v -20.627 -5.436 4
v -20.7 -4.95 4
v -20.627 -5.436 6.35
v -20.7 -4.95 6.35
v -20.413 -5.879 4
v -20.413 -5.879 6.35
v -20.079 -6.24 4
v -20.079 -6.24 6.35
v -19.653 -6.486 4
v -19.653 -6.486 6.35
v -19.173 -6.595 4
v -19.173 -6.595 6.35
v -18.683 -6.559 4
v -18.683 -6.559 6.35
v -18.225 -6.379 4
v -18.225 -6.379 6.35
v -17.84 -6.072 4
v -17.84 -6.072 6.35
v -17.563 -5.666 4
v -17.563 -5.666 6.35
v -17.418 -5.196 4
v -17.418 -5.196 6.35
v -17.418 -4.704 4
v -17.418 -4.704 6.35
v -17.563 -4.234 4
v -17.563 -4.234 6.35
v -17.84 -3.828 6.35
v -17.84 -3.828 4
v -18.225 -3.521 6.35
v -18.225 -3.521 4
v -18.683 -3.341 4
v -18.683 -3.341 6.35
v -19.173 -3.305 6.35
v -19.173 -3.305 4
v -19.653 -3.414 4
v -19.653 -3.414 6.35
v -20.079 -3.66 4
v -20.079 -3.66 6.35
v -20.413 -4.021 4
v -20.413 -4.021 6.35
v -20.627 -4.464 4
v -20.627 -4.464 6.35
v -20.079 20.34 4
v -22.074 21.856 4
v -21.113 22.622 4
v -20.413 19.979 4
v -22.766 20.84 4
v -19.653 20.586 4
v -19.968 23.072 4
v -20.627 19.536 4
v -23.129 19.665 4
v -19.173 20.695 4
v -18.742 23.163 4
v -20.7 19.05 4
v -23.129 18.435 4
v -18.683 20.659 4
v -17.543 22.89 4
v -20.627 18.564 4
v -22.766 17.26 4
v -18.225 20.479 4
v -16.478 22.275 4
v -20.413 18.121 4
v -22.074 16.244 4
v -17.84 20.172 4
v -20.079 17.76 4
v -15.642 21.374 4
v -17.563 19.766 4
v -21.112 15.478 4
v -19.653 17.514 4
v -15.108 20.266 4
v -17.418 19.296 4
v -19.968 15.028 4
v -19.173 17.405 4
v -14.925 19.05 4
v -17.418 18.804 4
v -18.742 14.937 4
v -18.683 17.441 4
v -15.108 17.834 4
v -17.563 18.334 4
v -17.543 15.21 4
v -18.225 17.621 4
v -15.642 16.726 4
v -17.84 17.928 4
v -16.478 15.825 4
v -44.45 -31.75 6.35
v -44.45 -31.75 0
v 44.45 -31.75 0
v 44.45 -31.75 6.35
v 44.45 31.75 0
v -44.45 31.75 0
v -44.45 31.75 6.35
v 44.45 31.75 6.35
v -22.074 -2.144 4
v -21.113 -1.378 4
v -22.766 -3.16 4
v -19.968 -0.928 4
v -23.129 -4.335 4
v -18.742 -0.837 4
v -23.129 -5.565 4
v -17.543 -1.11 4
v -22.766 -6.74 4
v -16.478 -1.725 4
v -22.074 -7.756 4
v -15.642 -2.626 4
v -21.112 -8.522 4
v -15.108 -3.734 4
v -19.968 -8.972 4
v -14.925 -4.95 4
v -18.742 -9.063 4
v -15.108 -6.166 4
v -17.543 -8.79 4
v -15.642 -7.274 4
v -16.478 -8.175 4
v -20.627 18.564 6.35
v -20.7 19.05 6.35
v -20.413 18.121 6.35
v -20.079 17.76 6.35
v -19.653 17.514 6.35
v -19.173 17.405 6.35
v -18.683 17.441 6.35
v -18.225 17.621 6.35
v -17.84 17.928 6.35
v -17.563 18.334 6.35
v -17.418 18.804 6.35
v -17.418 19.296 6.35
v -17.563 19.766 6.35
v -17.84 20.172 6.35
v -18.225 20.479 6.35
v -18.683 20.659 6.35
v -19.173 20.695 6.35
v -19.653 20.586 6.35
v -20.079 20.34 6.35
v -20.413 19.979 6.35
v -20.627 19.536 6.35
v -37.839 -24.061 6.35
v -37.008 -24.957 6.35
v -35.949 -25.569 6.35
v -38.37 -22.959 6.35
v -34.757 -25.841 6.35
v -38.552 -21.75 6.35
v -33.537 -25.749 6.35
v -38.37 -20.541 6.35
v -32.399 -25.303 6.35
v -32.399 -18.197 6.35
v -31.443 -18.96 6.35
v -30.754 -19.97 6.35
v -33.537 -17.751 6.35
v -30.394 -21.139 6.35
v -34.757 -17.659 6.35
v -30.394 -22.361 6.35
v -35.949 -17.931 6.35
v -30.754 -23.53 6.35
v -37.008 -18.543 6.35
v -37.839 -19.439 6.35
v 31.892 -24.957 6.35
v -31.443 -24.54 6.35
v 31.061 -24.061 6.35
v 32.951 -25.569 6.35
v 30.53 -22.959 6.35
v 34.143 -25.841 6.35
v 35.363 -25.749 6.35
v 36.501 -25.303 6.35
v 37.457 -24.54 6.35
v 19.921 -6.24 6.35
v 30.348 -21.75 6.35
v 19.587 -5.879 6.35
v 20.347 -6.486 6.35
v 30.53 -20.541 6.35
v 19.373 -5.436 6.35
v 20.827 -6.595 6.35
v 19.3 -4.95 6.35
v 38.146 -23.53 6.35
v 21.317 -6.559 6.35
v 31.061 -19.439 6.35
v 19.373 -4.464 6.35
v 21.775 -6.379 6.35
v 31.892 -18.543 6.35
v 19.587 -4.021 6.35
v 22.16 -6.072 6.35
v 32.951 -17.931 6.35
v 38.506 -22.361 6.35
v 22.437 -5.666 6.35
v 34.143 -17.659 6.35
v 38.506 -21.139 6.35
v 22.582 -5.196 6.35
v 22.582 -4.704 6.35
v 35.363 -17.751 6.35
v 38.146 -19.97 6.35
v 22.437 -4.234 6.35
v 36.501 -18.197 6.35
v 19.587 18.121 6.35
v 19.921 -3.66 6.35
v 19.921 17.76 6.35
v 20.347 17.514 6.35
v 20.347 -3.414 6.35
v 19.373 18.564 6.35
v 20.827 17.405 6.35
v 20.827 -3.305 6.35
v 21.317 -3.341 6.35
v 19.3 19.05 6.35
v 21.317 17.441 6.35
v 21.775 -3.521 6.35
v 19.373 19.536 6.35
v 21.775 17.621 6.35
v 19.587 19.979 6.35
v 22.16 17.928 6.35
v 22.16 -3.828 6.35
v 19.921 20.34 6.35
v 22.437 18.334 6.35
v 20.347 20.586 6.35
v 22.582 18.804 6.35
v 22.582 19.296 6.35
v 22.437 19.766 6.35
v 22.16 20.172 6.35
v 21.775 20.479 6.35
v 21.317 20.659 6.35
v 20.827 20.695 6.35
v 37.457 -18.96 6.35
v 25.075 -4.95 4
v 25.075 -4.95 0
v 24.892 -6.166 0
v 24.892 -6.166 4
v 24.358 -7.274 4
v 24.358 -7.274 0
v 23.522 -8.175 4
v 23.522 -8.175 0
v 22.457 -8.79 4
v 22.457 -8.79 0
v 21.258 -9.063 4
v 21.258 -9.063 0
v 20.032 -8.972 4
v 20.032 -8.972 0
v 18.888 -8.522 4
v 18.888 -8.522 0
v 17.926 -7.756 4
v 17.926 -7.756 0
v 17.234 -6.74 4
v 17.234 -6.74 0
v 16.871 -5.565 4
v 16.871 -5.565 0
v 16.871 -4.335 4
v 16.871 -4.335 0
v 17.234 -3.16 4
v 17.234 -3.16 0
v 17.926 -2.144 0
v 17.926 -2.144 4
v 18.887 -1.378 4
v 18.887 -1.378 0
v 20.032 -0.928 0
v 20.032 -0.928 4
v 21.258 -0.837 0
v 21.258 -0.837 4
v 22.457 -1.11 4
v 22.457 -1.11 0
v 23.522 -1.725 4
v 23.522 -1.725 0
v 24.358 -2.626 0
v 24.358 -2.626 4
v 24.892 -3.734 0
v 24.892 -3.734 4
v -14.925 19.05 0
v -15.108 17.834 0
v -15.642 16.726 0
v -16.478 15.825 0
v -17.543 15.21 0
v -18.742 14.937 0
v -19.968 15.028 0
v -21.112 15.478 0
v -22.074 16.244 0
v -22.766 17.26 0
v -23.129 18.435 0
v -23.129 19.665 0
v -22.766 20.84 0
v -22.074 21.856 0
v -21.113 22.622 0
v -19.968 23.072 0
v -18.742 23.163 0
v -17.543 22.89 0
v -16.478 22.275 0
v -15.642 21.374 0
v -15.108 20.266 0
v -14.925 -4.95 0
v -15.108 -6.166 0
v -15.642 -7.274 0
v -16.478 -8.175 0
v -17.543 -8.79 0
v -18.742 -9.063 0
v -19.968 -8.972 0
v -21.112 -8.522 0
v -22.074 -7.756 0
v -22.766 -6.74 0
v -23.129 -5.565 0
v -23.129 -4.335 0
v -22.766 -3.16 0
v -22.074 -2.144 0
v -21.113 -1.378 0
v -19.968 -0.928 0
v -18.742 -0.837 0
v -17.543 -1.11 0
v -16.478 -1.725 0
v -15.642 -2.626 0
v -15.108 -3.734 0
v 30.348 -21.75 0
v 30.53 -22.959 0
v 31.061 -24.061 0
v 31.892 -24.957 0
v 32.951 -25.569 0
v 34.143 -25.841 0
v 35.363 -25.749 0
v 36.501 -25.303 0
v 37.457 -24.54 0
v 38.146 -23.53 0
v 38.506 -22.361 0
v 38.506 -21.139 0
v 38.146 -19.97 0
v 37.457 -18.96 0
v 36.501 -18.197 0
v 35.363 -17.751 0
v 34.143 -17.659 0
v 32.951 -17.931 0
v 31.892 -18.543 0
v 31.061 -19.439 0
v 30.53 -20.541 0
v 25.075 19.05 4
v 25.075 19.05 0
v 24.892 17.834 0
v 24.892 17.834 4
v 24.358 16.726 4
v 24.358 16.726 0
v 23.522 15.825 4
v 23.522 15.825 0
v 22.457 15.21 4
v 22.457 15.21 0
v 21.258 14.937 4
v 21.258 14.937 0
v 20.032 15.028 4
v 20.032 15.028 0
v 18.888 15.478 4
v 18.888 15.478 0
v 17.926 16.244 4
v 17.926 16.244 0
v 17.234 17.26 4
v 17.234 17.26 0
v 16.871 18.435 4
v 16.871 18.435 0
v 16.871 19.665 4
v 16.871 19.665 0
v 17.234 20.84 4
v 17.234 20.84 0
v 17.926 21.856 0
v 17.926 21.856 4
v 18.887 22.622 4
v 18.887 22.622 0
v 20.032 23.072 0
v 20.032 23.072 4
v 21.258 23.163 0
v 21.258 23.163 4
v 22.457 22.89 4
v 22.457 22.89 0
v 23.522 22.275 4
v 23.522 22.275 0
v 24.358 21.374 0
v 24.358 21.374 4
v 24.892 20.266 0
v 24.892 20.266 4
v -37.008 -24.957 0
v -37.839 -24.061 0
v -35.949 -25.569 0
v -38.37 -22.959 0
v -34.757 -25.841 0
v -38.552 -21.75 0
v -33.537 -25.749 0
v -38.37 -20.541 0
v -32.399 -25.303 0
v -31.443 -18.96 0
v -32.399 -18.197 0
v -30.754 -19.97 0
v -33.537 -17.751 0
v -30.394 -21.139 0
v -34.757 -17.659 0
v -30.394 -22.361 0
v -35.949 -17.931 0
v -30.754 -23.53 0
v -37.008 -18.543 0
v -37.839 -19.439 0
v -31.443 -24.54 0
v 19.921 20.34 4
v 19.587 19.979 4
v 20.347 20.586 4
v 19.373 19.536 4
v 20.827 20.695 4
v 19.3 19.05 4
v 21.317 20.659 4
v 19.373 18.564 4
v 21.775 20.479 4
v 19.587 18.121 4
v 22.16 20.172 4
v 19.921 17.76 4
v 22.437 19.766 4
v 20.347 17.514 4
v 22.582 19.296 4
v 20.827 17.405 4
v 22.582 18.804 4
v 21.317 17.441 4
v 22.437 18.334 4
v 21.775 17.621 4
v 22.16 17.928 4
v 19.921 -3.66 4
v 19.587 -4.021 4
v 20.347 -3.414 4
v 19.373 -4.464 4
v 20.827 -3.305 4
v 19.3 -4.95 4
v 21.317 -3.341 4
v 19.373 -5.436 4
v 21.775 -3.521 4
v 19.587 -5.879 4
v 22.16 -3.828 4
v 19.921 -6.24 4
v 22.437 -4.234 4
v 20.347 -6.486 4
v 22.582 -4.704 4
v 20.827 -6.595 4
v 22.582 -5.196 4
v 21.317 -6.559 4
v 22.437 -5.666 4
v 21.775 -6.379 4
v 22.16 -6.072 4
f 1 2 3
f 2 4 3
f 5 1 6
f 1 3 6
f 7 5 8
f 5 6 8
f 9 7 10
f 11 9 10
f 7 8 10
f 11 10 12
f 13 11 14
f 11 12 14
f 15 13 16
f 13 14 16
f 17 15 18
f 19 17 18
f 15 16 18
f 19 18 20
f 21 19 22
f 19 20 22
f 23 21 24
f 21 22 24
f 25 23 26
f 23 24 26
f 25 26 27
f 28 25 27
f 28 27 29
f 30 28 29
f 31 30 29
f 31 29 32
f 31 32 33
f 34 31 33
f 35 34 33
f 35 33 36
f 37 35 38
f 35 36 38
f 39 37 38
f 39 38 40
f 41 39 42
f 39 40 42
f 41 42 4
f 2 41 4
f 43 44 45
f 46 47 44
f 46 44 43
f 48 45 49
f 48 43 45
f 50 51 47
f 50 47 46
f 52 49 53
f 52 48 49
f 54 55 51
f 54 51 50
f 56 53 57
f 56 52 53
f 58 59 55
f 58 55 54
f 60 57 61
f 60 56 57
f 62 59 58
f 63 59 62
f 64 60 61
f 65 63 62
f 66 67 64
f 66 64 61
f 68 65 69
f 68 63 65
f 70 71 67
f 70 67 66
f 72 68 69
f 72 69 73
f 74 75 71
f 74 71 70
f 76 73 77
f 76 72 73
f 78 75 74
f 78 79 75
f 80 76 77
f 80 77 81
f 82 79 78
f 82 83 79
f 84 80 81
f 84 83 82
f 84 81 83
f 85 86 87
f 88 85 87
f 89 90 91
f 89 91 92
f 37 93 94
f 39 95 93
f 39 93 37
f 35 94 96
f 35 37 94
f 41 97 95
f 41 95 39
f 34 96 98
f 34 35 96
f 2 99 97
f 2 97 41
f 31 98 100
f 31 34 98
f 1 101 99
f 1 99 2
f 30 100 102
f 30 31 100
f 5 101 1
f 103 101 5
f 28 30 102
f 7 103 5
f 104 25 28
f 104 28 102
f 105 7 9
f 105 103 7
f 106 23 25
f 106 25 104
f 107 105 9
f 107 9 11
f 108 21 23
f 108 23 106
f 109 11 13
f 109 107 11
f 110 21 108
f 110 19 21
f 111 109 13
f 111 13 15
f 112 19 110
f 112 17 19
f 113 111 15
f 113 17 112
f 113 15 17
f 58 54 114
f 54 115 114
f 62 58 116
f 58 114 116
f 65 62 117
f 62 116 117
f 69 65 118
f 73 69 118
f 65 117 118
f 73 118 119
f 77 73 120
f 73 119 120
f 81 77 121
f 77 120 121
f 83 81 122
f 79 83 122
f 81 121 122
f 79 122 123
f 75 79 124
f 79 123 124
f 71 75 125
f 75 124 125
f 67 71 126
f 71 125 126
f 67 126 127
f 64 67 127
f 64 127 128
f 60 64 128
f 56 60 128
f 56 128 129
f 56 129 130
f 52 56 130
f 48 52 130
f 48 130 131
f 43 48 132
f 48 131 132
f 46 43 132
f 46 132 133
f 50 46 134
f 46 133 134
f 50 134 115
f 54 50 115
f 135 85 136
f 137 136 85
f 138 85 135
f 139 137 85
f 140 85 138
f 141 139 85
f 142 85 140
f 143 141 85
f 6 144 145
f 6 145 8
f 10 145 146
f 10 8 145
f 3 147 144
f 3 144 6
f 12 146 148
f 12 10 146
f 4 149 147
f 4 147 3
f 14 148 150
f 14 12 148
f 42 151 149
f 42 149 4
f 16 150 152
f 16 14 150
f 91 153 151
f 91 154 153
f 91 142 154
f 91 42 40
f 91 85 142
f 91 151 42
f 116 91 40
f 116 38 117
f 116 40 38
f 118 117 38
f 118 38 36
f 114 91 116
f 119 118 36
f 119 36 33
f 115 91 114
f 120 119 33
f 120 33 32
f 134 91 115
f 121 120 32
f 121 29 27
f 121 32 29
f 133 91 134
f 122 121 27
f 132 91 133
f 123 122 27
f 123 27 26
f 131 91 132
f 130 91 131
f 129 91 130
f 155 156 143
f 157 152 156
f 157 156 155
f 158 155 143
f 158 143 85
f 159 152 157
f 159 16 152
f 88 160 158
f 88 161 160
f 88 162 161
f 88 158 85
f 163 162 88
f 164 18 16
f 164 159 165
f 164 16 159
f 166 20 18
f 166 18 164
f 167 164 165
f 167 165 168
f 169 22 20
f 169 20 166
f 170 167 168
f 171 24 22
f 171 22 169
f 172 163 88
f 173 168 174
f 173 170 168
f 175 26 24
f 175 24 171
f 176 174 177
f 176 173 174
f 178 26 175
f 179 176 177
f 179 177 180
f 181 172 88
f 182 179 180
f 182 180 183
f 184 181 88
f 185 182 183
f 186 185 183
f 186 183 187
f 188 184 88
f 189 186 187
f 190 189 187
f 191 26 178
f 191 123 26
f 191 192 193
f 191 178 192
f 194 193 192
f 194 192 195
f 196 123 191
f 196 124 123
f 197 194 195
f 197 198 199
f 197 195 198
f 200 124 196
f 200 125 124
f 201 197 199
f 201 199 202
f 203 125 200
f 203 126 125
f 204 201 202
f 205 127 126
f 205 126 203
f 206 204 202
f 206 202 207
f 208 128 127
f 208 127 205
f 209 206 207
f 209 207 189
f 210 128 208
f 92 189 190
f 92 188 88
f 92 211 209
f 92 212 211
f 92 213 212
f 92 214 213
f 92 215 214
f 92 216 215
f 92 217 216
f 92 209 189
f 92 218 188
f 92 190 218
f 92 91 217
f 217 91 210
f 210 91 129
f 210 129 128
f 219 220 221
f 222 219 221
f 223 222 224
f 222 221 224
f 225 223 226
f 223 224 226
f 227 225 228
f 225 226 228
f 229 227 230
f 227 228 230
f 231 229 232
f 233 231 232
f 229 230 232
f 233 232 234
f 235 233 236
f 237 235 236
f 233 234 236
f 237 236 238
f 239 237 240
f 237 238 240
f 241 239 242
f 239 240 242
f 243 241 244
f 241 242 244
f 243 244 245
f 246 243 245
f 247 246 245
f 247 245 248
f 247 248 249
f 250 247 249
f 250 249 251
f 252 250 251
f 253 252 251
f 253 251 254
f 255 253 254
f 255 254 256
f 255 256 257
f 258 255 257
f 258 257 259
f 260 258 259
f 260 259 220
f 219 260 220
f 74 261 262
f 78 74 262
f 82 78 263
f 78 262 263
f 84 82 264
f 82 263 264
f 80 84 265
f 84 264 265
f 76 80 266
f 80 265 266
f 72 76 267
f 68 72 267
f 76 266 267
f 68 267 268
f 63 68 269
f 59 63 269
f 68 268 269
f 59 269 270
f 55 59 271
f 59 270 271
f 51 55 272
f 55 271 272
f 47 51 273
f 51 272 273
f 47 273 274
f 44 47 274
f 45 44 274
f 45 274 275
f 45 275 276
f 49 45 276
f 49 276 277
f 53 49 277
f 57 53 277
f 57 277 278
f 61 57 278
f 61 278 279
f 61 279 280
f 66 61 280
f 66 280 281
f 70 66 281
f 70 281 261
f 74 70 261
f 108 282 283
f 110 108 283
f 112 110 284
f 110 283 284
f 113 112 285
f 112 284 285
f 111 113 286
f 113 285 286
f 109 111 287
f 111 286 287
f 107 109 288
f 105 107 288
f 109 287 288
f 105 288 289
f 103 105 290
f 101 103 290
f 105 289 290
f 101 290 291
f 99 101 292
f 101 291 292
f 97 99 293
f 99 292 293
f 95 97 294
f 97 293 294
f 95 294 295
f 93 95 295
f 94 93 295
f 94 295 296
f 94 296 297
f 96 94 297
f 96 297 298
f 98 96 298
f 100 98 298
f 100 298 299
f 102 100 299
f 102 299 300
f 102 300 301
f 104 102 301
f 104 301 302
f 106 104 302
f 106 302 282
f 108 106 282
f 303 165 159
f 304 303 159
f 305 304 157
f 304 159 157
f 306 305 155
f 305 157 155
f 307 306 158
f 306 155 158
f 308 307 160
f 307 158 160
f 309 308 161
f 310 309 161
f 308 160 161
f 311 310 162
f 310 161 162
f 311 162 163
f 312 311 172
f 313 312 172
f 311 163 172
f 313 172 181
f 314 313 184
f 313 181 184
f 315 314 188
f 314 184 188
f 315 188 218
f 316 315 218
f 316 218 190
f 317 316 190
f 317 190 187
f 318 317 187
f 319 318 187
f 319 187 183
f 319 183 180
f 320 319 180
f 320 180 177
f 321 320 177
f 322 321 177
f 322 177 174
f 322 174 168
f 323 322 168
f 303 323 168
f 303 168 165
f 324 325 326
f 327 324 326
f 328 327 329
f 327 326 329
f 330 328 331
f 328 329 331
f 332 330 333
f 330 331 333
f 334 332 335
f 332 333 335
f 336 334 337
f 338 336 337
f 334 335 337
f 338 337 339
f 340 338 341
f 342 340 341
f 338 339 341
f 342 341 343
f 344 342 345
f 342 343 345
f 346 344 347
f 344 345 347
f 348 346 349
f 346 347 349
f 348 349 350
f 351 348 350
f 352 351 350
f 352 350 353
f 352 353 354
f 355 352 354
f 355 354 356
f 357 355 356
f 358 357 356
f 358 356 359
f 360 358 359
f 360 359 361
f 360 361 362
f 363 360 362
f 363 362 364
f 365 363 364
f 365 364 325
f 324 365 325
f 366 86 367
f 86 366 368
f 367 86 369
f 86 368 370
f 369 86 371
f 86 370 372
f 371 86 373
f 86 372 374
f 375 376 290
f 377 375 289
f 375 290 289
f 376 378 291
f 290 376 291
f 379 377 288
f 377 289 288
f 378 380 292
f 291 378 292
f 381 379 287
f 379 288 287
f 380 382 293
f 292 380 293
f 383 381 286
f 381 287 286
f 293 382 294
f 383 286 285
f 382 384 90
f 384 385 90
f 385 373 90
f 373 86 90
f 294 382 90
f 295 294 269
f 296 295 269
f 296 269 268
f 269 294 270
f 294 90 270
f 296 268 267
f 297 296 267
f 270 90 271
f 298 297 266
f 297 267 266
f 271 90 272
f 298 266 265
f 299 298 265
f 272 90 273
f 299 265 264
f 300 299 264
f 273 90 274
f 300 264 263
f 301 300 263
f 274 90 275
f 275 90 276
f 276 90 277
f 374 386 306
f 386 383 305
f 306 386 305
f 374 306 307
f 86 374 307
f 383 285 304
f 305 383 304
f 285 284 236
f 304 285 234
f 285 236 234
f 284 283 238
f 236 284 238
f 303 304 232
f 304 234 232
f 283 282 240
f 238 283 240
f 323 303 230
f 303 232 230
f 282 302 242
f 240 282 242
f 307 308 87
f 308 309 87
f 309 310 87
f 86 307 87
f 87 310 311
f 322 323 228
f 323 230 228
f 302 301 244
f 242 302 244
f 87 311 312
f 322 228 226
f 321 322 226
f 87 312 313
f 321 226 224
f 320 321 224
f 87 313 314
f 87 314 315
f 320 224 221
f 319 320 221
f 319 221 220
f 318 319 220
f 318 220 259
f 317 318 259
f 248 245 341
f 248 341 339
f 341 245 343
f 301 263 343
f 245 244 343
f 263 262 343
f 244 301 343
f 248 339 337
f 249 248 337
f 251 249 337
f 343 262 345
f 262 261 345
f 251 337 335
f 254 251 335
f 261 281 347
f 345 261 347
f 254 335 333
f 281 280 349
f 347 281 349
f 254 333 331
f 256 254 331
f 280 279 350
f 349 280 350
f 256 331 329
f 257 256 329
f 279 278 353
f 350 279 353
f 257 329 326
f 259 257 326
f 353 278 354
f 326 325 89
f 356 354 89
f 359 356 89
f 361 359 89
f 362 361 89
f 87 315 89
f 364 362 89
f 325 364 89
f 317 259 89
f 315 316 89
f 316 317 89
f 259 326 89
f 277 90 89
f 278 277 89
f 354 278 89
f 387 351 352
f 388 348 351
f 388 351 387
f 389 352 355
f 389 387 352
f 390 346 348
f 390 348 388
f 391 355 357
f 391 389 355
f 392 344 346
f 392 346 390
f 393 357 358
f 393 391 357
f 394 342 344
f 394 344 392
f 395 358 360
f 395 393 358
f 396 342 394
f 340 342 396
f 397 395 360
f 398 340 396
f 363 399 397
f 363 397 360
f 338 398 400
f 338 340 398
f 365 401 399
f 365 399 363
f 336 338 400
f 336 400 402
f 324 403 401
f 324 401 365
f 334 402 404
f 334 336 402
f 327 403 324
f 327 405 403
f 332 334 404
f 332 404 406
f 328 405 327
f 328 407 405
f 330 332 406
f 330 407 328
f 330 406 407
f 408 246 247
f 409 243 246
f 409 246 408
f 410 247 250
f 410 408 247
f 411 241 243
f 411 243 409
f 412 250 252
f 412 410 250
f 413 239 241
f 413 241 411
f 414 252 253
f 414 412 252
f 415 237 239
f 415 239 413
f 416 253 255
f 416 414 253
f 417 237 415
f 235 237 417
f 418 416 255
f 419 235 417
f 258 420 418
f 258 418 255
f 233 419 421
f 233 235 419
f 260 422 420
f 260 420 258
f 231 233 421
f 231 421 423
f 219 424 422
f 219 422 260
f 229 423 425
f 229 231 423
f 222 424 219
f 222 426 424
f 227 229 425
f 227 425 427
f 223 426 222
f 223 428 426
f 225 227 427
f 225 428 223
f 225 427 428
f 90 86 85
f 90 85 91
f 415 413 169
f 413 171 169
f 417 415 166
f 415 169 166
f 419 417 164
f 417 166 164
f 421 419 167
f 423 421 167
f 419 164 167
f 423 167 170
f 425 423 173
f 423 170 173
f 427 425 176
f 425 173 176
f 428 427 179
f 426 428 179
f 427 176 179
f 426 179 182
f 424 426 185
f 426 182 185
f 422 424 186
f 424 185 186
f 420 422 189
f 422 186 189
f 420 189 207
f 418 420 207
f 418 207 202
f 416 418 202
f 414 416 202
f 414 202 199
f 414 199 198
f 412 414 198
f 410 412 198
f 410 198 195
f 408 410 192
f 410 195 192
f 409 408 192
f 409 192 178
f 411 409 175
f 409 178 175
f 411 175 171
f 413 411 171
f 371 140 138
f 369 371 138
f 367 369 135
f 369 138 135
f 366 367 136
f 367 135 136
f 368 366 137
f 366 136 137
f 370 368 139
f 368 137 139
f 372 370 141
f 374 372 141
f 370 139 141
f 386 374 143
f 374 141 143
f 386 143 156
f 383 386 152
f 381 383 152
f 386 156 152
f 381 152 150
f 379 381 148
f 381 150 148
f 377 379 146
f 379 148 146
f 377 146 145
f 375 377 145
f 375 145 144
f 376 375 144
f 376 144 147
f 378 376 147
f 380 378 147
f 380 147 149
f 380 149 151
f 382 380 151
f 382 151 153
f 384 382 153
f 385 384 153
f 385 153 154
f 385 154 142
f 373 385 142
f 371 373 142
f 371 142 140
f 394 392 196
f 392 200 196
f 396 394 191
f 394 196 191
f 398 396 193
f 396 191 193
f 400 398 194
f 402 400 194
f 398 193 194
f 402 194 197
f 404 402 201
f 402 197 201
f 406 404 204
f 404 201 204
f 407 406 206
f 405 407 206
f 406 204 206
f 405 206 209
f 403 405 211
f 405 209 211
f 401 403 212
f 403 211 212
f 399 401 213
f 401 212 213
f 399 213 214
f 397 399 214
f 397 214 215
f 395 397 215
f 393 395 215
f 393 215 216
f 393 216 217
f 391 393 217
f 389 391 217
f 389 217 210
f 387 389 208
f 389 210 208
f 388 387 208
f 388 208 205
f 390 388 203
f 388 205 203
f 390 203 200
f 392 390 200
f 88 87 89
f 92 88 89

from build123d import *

# Parameters (mm, degrees)
F0_W           = 88.9
F0_H           = 63.5
F1_DEPTH       = 6.35
F2_D           = 8.2042
F3_D           = 3.3
F3_CBORE_D     = 8.25
F3_CBORE_DEPTH = 4


# Not quite as in the source:
# - a feature names something its author has since deleted; it is built from what else it names


with BuildPart() as f1:
    # F0 (on Top) → F1 (new body)
    with BuildSketch(Plane.XY):
        Rectangle(F0_W, F0_H)
    extrude(amount=F1_DEPTH)

    # F2 (through all)
    with Locations(Plane(origin=(0, 0, 0), x_dir=(1, 0, 0), z_dir=(0, 0, -1))):
        with Locations((-34.45, 21.75), (34.45, 21.75)):
            Hole(F2_D / 2)

    # F3 (through all)
    with Locations(Plane(origin=(0, 0, 0), x_dir=(1, 0, 0), z_dir=(0, 0, -1))):
        with Locations((-19.05, -19.05), (-19.05, 4.95), (20.95, -19.05), (20.95, 4.95)):
            CounterBoreHole(F3_D / 2, F3_CBORE_D / 2, F3_CBORE_DEPTH)


solid = f1.part
